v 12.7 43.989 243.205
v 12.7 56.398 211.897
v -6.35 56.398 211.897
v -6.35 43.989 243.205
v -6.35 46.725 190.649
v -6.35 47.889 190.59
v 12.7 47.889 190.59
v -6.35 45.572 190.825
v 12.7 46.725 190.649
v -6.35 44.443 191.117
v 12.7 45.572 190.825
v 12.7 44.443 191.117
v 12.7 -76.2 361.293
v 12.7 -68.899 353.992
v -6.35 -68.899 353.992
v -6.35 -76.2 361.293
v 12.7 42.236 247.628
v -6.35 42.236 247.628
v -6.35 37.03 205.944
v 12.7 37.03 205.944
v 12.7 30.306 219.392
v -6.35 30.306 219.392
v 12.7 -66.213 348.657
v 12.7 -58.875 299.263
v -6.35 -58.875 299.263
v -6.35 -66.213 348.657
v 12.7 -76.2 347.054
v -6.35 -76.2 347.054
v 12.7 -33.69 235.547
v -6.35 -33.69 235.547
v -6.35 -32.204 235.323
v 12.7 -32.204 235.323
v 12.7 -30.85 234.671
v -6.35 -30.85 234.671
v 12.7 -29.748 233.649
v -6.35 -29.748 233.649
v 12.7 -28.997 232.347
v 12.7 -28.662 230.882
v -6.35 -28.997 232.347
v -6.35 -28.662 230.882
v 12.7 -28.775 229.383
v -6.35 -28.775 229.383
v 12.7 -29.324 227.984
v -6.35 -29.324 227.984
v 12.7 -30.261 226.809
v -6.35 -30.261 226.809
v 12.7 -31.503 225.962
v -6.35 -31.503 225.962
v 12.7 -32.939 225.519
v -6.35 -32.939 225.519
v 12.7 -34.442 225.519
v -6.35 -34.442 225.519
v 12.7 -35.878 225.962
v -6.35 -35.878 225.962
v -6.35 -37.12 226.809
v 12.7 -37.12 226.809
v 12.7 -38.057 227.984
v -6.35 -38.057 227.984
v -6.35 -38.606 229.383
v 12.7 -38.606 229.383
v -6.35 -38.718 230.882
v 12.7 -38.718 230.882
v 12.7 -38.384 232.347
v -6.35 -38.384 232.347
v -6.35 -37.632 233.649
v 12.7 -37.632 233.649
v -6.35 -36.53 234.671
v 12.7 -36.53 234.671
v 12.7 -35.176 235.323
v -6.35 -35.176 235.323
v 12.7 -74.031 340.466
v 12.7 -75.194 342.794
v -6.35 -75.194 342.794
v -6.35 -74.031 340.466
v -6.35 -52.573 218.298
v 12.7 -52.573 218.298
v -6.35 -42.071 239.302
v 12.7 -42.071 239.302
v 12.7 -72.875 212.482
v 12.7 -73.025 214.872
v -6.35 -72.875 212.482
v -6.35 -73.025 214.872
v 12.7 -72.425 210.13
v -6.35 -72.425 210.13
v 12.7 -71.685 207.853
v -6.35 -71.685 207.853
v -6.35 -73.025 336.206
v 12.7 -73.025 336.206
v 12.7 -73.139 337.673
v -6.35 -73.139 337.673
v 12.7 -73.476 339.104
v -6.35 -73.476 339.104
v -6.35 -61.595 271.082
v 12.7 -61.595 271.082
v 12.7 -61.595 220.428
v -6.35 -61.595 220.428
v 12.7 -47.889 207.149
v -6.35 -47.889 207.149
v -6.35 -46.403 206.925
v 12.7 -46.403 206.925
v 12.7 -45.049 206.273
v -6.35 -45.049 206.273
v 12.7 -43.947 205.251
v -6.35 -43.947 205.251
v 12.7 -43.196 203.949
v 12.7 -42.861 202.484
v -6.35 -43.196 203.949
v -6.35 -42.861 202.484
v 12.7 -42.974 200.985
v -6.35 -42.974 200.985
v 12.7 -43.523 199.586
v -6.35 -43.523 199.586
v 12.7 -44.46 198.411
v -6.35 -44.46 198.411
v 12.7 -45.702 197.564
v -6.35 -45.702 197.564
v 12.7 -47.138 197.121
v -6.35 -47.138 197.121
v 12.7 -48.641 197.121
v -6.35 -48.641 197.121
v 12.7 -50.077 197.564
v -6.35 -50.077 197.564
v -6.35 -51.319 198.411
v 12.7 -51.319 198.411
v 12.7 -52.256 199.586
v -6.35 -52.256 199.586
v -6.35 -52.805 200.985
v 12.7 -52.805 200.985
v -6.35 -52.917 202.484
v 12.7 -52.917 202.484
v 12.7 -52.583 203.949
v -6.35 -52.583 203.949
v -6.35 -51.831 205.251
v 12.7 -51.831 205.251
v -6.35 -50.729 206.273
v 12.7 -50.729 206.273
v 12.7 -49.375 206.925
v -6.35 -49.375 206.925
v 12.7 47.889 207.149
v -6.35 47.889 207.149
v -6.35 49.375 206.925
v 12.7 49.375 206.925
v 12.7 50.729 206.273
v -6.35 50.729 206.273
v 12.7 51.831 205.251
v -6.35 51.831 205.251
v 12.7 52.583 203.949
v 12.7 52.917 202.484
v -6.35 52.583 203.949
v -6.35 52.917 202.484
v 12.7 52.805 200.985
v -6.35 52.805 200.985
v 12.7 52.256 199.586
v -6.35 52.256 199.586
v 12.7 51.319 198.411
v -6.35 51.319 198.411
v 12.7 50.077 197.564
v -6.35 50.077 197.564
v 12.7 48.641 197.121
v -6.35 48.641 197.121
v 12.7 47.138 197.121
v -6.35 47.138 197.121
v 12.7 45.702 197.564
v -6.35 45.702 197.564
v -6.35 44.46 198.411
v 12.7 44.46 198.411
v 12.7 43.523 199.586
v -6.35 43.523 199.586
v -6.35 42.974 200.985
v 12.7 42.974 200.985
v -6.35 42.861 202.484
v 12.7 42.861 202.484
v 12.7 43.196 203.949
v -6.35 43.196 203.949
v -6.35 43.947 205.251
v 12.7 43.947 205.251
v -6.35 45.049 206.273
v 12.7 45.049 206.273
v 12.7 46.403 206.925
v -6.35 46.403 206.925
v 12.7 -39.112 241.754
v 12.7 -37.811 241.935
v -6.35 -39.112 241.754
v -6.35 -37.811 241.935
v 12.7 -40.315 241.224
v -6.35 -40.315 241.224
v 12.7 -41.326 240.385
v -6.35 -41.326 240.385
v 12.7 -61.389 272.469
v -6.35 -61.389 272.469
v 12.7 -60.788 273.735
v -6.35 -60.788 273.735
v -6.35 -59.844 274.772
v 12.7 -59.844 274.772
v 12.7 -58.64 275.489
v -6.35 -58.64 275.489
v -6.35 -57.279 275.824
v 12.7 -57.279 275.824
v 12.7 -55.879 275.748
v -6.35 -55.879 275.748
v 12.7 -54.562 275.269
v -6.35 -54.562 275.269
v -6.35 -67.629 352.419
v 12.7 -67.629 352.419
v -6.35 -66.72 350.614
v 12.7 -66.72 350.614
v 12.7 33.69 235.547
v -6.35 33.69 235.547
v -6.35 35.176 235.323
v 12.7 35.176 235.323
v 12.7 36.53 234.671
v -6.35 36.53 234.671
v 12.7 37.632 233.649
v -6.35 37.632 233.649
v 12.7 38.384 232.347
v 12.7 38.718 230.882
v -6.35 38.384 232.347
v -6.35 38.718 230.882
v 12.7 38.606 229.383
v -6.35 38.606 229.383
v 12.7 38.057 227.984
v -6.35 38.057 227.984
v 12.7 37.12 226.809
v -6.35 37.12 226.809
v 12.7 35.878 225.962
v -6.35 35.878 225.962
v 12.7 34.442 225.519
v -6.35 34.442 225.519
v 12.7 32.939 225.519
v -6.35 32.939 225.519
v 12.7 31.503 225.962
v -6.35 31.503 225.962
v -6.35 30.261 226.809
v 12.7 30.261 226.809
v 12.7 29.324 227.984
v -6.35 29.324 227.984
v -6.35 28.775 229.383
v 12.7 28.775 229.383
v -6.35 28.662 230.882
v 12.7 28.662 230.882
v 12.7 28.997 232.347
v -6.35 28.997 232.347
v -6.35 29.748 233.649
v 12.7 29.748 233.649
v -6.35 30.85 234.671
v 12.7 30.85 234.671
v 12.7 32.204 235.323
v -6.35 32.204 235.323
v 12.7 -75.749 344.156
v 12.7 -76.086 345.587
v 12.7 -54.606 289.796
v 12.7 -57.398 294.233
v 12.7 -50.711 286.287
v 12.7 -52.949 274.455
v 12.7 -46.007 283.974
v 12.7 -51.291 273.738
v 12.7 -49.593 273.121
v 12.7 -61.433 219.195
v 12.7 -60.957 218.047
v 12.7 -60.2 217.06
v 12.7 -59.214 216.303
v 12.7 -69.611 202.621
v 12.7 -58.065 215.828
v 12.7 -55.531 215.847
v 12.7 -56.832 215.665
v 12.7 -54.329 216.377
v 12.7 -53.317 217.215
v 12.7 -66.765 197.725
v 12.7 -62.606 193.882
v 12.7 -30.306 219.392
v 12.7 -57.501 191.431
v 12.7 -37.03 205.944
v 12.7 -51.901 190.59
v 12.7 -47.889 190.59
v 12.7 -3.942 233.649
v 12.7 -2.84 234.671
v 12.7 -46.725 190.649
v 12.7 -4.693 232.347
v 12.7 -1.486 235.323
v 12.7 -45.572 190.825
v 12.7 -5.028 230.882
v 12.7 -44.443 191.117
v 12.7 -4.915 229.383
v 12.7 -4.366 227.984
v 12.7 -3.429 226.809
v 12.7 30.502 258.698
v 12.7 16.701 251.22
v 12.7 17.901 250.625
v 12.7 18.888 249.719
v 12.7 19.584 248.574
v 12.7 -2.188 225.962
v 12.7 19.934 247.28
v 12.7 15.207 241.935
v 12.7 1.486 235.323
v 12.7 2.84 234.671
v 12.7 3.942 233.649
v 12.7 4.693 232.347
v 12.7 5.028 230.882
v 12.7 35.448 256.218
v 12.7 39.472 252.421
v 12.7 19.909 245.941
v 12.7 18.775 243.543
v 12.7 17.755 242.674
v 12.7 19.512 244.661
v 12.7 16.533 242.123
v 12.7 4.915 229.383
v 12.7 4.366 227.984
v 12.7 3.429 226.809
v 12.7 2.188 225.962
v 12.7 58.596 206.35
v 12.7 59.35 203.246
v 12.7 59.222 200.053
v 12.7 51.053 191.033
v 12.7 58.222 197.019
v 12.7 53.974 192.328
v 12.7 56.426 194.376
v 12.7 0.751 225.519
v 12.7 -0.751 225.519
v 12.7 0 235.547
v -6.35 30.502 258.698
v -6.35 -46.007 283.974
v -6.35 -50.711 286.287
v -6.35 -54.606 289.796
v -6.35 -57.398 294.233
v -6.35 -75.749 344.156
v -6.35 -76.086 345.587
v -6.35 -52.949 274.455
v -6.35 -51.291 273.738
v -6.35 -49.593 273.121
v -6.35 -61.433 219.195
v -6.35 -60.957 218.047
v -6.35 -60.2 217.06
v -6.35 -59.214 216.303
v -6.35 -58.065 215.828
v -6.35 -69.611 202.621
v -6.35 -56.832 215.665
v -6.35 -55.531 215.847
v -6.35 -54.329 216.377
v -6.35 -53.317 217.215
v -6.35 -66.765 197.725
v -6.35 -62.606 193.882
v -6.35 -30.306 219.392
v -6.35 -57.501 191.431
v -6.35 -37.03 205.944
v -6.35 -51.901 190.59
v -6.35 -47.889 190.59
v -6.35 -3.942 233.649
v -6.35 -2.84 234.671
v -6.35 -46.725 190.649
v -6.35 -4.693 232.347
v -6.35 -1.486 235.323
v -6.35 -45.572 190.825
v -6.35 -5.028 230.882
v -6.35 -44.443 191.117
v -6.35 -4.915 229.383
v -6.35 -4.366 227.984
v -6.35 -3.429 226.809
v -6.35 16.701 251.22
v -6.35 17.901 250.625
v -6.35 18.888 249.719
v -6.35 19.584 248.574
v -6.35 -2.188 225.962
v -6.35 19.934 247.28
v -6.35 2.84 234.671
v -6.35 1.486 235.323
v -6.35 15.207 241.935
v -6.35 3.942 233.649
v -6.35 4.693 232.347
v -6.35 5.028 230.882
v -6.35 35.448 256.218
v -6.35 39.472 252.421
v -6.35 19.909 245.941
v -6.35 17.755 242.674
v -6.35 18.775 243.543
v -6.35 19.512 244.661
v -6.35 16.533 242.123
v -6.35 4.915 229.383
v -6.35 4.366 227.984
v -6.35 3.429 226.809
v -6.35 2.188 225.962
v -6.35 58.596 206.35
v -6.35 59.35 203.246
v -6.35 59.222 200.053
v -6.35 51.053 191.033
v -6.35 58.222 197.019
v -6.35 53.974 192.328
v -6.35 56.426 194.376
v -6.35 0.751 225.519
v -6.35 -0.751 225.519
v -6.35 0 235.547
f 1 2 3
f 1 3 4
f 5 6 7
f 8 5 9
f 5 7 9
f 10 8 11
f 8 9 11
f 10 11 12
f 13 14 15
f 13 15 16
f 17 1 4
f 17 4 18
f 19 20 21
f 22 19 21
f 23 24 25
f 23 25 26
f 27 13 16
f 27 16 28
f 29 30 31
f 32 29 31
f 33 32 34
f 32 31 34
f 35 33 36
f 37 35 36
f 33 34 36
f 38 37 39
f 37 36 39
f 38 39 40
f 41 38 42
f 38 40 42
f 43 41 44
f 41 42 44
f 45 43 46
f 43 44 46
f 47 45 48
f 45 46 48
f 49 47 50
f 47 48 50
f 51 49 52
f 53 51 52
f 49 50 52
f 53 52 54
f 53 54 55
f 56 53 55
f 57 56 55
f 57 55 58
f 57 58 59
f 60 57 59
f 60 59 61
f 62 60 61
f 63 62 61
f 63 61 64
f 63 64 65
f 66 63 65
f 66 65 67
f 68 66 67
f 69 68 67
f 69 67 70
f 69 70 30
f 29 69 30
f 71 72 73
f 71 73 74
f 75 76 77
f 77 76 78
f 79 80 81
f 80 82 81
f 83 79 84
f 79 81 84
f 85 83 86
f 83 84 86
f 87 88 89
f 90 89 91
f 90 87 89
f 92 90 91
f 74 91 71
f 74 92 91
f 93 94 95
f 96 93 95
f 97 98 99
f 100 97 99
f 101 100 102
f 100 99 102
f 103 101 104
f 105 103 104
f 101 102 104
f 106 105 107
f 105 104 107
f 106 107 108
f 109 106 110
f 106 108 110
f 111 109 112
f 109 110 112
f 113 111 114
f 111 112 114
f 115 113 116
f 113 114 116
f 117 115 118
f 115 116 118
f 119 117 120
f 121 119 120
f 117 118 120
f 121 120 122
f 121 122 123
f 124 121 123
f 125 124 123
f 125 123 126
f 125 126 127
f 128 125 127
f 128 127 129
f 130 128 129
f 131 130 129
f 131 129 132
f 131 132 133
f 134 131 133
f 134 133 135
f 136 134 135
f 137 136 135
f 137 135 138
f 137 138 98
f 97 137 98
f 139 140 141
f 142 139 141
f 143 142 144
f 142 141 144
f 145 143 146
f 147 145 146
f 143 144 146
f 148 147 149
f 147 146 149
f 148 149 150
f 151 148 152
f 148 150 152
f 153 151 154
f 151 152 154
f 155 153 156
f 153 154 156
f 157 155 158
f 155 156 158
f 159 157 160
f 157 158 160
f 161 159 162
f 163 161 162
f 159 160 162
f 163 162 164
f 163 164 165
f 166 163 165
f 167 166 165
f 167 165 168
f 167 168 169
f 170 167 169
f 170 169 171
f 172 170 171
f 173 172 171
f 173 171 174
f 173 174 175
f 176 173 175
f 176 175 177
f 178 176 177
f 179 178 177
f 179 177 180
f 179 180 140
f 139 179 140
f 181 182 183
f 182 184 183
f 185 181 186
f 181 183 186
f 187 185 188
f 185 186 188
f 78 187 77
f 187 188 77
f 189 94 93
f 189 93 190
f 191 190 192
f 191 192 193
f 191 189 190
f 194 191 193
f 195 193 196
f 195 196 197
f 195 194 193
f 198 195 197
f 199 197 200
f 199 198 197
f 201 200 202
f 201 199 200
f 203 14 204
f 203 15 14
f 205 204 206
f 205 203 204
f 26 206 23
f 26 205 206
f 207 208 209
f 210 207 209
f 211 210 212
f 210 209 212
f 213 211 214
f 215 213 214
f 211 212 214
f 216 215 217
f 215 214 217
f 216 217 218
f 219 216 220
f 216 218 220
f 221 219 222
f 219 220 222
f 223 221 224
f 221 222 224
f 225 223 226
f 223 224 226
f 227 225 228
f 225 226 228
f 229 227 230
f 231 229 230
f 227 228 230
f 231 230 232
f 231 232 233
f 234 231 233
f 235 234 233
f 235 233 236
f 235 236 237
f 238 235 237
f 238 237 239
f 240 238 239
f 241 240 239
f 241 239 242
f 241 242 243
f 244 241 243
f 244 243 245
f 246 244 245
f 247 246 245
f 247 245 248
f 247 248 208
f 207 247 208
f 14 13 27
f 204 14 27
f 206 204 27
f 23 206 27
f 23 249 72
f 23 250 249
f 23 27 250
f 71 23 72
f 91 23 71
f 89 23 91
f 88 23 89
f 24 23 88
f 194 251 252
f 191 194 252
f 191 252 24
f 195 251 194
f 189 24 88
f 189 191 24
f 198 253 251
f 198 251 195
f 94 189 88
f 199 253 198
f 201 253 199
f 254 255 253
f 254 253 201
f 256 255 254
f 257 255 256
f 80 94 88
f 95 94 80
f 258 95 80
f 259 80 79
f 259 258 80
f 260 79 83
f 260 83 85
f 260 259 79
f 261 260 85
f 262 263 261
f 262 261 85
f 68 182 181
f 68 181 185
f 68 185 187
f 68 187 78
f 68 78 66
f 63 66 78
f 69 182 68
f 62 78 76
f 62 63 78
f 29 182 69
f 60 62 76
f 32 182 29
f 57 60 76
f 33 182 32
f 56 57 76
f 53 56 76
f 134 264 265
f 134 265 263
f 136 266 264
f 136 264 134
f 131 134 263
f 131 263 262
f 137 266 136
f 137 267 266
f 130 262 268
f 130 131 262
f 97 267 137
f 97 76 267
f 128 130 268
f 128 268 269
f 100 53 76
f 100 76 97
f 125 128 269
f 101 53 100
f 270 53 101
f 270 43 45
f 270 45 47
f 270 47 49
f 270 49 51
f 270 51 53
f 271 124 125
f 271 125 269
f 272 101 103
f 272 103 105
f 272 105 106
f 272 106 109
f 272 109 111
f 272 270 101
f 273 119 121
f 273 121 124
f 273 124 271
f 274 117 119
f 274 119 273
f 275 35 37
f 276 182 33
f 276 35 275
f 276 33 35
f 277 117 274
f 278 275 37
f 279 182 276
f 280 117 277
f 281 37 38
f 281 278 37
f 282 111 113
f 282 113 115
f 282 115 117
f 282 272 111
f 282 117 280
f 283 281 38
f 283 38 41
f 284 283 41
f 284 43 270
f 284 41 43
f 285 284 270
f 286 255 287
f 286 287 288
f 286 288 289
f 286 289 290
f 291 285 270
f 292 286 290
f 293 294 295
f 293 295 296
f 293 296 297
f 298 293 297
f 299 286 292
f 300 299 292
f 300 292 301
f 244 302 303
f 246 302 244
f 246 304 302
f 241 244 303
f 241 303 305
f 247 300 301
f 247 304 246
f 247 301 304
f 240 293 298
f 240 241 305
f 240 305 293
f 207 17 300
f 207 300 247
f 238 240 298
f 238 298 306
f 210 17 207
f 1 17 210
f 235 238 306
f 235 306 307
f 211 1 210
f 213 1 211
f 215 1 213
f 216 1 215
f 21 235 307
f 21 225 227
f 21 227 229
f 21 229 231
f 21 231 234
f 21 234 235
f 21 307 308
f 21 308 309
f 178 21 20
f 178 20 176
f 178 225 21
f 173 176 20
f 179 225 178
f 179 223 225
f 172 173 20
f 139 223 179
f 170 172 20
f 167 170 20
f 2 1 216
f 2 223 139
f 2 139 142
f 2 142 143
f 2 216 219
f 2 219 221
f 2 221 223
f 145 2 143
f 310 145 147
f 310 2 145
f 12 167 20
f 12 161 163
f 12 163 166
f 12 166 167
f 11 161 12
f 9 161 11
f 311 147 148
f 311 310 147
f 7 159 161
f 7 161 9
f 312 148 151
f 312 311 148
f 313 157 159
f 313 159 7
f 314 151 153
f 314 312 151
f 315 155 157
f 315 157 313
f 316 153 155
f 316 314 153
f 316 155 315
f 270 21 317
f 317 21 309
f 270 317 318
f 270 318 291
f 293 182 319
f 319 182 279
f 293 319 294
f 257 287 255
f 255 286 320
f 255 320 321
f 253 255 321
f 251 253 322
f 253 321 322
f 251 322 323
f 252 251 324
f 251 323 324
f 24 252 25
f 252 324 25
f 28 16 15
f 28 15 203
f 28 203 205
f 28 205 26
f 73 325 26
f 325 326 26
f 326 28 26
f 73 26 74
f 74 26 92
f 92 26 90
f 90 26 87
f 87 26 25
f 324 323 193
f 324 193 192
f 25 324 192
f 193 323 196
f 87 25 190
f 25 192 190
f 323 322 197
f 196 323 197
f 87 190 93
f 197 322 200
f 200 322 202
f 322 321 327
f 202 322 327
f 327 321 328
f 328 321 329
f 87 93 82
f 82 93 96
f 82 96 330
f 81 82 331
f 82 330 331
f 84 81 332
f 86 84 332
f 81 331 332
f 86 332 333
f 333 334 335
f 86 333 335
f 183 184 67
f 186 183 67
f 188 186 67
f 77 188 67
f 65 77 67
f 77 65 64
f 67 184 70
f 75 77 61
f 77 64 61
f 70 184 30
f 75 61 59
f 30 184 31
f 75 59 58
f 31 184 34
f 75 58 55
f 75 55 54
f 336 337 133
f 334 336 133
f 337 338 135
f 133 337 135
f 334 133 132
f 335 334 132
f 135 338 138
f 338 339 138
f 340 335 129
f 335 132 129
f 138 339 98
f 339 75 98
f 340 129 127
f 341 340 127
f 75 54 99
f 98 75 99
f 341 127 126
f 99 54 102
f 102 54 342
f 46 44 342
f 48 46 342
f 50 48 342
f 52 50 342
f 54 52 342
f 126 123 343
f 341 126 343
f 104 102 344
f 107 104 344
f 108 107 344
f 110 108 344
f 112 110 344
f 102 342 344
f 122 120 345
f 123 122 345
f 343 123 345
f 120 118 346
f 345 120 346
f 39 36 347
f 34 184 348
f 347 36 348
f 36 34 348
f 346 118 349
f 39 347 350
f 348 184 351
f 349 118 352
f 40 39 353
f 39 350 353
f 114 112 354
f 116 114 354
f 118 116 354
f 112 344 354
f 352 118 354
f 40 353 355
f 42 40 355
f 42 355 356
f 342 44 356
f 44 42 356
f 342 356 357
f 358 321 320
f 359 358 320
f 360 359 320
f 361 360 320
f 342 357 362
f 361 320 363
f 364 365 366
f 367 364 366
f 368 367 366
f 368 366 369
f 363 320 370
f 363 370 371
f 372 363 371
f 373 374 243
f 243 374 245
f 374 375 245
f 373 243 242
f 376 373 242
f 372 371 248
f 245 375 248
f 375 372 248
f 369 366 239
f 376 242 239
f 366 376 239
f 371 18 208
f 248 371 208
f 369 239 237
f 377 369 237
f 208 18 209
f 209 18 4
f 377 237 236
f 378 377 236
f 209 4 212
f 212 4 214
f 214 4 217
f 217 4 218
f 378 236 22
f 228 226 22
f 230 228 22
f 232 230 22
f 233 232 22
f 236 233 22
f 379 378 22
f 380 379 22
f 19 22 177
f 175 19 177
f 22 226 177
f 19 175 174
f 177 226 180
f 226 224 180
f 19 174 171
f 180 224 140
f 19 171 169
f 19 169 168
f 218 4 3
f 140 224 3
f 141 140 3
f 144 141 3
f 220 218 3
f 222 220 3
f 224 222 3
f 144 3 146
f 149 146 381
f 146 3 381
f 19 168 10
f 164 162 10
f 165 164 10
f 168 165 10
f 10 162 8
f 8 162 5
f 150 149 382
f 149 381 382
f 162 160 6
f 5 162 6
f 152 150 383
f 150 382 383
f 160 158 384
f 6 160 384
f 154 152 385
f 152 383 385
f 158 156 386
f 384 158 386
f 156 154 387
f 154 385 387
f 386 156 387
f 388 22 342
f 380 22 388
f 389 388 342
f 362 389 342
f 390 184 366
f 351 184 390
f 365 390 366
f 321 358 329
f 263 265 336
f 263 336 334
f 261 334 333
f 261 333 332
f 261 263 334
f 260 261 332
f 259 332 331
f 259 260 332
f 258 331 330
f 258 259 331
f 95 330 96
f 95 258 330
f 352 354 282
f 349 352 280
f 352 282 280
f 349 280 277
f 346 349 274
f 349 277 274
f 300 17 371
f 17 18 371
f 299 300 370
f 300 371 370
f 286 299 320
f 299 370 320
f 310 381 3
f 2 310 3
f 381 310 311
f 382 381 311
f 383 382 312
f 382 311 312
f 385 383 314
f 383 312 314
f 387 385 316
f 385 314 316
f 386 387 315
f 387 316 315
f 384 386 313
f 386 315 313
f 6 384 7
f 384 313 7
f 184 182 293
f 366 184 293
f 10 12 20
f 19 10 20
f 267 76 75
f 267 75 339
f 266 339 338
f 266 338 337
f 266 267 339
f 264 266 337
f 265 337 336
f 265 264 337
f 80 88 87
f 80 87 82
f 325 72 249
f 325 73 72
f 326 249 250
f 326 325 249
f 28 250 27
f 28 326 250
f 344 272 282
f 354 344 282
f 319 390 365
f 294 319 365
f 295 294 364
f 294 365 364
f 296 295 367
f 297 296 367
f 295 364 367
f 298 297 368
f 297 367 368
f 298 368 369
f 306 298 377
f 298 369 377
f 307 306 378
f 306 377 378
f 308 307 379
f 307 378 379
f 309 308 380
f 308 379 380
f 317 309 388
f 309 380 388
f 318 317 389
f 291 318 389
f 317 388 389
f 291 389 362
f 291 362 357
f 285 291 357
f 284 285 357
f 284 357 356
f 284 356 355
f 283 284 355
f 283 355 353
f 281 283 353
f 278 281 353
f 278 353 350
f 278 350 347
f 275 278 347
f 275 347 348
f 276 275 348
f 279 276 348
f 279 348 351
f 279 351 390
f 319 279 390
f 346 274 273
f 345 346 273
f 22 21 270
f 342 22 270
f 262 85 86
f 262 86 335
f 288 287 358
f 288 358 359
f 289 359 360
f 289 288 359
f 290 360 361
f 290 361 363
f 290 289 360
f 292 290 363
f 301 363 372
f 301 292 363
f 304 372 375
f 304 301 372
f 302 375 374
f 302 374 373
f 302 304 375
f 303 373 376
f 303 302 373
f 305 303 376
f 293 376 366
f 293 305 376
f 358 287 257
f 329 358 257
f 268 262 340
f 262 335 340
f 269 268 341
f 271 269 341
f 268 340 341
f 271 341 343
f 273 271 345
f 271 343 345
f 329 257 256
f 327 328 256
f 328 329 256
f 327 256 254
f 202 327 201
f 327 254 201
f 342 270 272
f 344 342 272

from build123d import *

# Parameters (mm, degrees)
SKETCH1_R               = 7.9375
SKETCH1_R_2             = 11.1125
BOSS_EXTRUDE1_DEPTH     = 12.7
F_8_CLEARANCE_HOLE1_D   = 4.4958
SKETCH5_R               = 18.415
CUT_EXTRUDE1_DEPTH      = 13.7
SKETCH7_R               = 9.525
CUT_EXTRUDE2_DEPTH      = 13.7
CUT_EXTRUDE3_DEPTH      = 13.7
BOSS_EXTRUDE2_DEPTH     = 12.7
CUT_EXTRUDE4_DEPTH      = 13.7
SKETCH11_W              = 12.7
SKETCH11_H              = 178.054
CUT_EXTRUDE5_DEPTH      = 3.175
BOSS_EXTRUDE3_DEPTH     = 19.05
CUT_EXTRUDE6_DEPTH      = 20.05
F_3_8_CLEARANCE_HOLE1_D = 10.0838
CUT_EXTRUDE7_DEPTH      = 20.05
BOSS_EXTRUDE4_DEPTH     = 19.05
FILLET1_R               = 19.05
FILLET2_R               = 9.525
CUT_EXTRUDE8_DEPTH      = 20.05
BOSS_EXTRUDE5_DEPTH     = 19.05
FILLET3_R               = 4.7625


with BuildPart() as part:
    # Sketch1 → Boss-Extrude1 (new body)
    with BuildSketch(Plane(origin=(0, 0, 0), x_dir=(0, 0, -1), z_dir=(1, 0, 0))):
        with BuildLine():
            Line((93.345, 0), (55.245, 50.8))
            Line((55.245, 50.8), (-160.655, 50.8))
            ThreePointArc((-160.655, 50.8), (-211.455, 0), (-160.655, -50.8))
            Line((-160.655, -50.8), (55.245, -50.8))
            Line((55.245, -50.8), (93.345, 0))
        make_face()
        with Locations((-88.9, 0)):
            Circle(SKETCH1_R, mode=Mode.SUBTRACT)
        with Locations((-38.1, 0)):
            Circle(SKETCH1_R, mode=Mode.SUBTRACT)
        with Locations((-160.655, 0)):
            Circle(SKETCH1_R_2, mode=Mode.SUBTRACT)
        Circle(SKETCH1_R, mode=Mode.SUBTRACT)
    extrude(amount=BOSS_EXTRUDE1_DEPTH)

    # #8 Clearance Hole1 (through all)
    with Locations(Plane.ZY):
        with Locations((-17.691104559, 17.691104559), (17.691104559, 17.691104559), (17.691104559, -17.691104559), (-17.691104559, -17.691104559)):
            Hole(F_8_CLEARANCE_HOLE1_D / 2)

    # Sketch5 → Cut-Extrude1 (cut, through all)
    with BuildSketch(Plane.ZY):
        Circle(SKETCH5_R)
    extrude(amount=-CUT_EXTRUDE1_DEPTH, mode=Mode.SUBTRACT)

    # Sketch7 → Cut-Extrude2 (cut, through all)
    with BuildSketch(Plane.ZY):
        with Locations((-55.245, 0)):
            Circle(SKETCH7_R)
    extrude(amount=-CUT_EXTRUDE2_DEPTH, mode=Mode.SUBTRACT)

    # Sketch8 → Cut-Extrude3 (cut, through all)
    with BuildSketch(Plane(origin=(12.7, 0, 0), x_dir=(0, 0, -1), z_dir=(1, 0, 0))):
        Polygon((-160.655, 50.8), (-211.455, 25.4), (-211.455, -25.4), (-160.655, -50.8), (-233.239745749, -50.8), (-233.239745749, 50.8), align=None)
    extrude(amount=-CUT_EXTRUDE3_DEPTH, mode=Mode.SUBTRACT)

    # Sketch9 → Boss-Extrude2 (add)
    with BuildSketch(Plane(origin=(12.7, 0, 0), x_dir=(0, 0, -1), z_dir=(1, 0, 0))):
        Polygon((-160.655, 50.8), (-211.455, 25.4), (-211.455, 0), (-211.455, -25.4), (-160.655, -50.8), (-160.655, -40.64), (-202.749323348, 0), (-160.655, 40.64), align=None)
    extrude(amount=-BOSS_EXTRUDE2_DEPTH)

    # Sketch10 → Cut-Extrude4 (cut, through all)
    with BuildSketch(Plane.ZY):
        Polygon((-79.0575, -19.05), (-79.0575, 19.05), (-93.345, 0), align=None)
    extrude(amount=-CUT_EXTRUDE4_DEPTH, mode=Mode.SUBTRACT)

    # Sketch11 → Cut-Extrude5 (cut)
    with BuildSketch(Plane(origin=(0, 50.8, 0), x_dir=(1, 0, 0), z_dir=(0, 1, 0))):
        with Locations((6.35, -52.705)):
            Rectangle(SKETCH11_W, SKETCH11_H)
    cut_extrude5 = extrude(amount=-CUT_EXTRUDE5_DEPTH, mode=Mode.SUBTRACT)

    # Mirror1: Cut-Extrude5 across plane
    add(cut_extrude5.mirror(Plane.ZX), mode=Mode.SUBTRACT)

    # Sketch13 → Cut-Extrude6 (cut, through all)
    with BuildSketch(Plane(origin=(12.7, 0, 0), x_dir=(0, 0, -1), z_dir=(1, 0, 0))):
        Polygon((-161.254612663, -53.34), (-139.192, -53.34), (-139.192, -50.165), (33.782, -50.165), (33.782, -53.34), (56.515, -53.34), (81.5975, -19.896666667), (81.5975, 19.896666667), (56.515, 53.34), (33.782, 53.34), (33.782, 50.165), (-139.192, 50.165), (-139.192, 53.34), (-161.254612663, 53.34), (-213.995, 26.969806331), (-213.995, -26.969806331), align=None)
    extrude(amount=-CUT_EXTRUDE6_DEPTH, mode=Mode.SUBTRACT)


with BuildPart() as body_2:
    # Sketch12 → Boss-Extrude3 (new body)
    with BuildSketch(Plane(origin=(12.7, 0, 0), x_dir=(0, 0, -1), z_dir=(1, 0, 0))):
        with BuildLine():
            ThreePointArc((-211.89681554, -56.397839854), (-236.855, 0), (-211.89681554, 56.397839854))
            Line((-211.89681554, 56.397839854), (-243.205, 43.989212666))
            Line((-243.205, 43.989212666), (-243.205, -43.989212666))
            Line((-243.205, -43.989212666), (-211.89681554, -56.397839854))
        make_face()
        with BuildLine():
            Line((-217.805, 29.324515829), (-162.154031657, 57.15))
            Line((-162.154031657, 57.15), (-166.916531657, 66.675))
            Line((-166.916531657, 66.675), (-185.966531657, 66.675))
            Line((-185.966531657, 66.675), (-211.89681554, 56.397839854))
            ThreePointArc((-211.89681554, 56.397839854), (-236.855, 0), (-211.89681554, -56.397839854))
            Line((-211.89681554, -56.397839854), (-185.966531657, -66.675))
            Line((-185.966531657, -66.675), (-166.916531657, -66.675))
            Line((-166.916531657, -66.675), (-162.154031657, -57.15))
            Line((-162.154031657, -57.15), (-217.805, -29.324515829))
            Line((-217.805, -29.324515829), (-217.805, 29.324515829))
        make_face()
    extrude(amount=-BOSS_EXTRUDE3_DEPTH)

    # 3/8 Clearance Hole1 (through all)
    with Locations(Plane(origin=(12.7, 0, 0), x_dir=(0, 0, -1), z_dir=(1, 0, 0))):
        with Locations((-230.505, 0), (-230.505, 33.690140829), (-202.106936686, 47.889172486), (-230.505, -33.690140829), (-202.106936686, -47.889172486)):
            Hole(F_3_8_CLEARANCE_HOLE1_D / 2)

    # Sketch16 → Cut-Extrude7 (cut, through all)
    with BuildSketch(Plane(origin=(12.7, 0, 0), x_dir=(0, 0, -1), z_dir=(1, 0, 0))):
        with BuildLine():
            ThreePointArc((-190.589767426, 47.889172486), (-190.722432786, 46.146112328), (-191.117372542, 44.443208515))
            Line((-191.117372542, 44.443208515), (-162.86398324, 58.569903166))
            Line((-162.86398324, 58.569903166), (-166.916531657, 66.675))
            Line((-166.916531657, 66.675), (-185.966531657, 66.675))
            Line((-185.966531657, 66.675), (-206.35048523, 58.596062021))
            ThreePointArc((-206.35048523, 58.596062021), (-195.635015761, 57.415946719), (-190.589767426, 47.889172486))
        make_face()
        with BuildLine():
            Line((-162.86398324, 58.569903166), (-191.117372542, 44.443208515))
            ThreePointArc((-191.117372542, 44.443208515), (-191.551739911, 43.281243579), (-192.108559765, 42.172735946))
            Line((-192.108559765, 42.172735946), (-162.154031657, 57.15))
            Line((-162.154031657, 57.15), (-162.86398324, 58.569903166))
        make_face()
        with BuildLine():
            Line((-191.117372542, 44.443208515), (-205.943903995, 37.029942788))
            ThreePointArc((-205.943903995, 37.029942788), (-204.753711625, 36.680257722), (-203.532813606, 36.460609025))
            Line((-203.532813606, 36.460609025), (-192.108559765, 42.172735946))
            ThreePointArc((-192.108559765, 42.172735946), (-191.551739911, 43.281243579), (-191.117372542, 44.443208515))
        make_face()
        with BuildLine():
            Line((-219.3925, 30.305644786), (-219.3925, -30.305644786))
            Line((-219.3925, -30.305644786), (-205.943903995, -37.029942788))
            ThreePointArc((-205.943903995, -37.029942788), (-204.753711625, -36.680257722), (-203.532813606, -36.460609025))
            Line((-203.532813606, -36.460609025), (-217.805, -29.324515829))
            Line((-217.805, -29.324515829), (-217.805, 29.324515829))
            Line((-217.805, 29.324515829), (-203.532813606, 36.460609025))
            ThreePointArc((-203.532813606, 36.460609025), (-204.753711625, 36.680257722), (-205.943903995, 37.029942788))
            Line((-205.943903995, 37.029942788), (-219.3925, 30.305644786))
        make_face()
        with BuildLine():
            ThreePointArc((-203.532813606, -36.460609025), (-204.753711625, -36.680257722), (-205.943903995, -37.029942788))
            Line((-205.943903995, -37.029942788), (-191.117372542, -44.443208515))
            ThreePointArc((-191.117372542, -44.443208515), (-191.551739911, -43.281243579), (-192.108559765, -42.172735946))
            Line((-192.108559765, -42.172735946), (-203.532813606, -36.460609025))
        make_face()
        with BuildLine():
            ThreePointArc((-192.108559765, -42.172735946), (-191.551739911, -43.281243579), (-191.117372542, -44.443208515))
            Line((-191.117372542, -44.443208515), (-162.86398324, -58.569903166))
            Line((-162.86398324, -58.569903166), (-162.154031657, -57.15))
            Line((-162.154031657, -57.15), (-192.108559765, -42.172735946))
        make_face()
        with BuildLine():
            Line((-162.86398324, -58.569903166), (-191.117372542, -44.443208515))
            ThreePointArc((-191.117372542, -44.443208515), (-190.722432786, -46.146112328), (-190.589767426, -47.889172486))
            Line((-190.589767426, -47.889172486), (-190.589767426, -64.842635395))
            Line((-190.589767426, -64.842635395), (-185.966531657, -66.675))
            Line((-185.966531657, -66.675), (-166.916531657, -66.675))
            Line((-166.916531657, -66.675), (-162.86398324, -58.569903166))
        make_face()
    extrude(amount=-CUT_EXTRUDE7_DEPTH, mode=Mode.SUBTRACT)

    # Sketch17 → Boss-Extrude4 (add)
    with BuildSketch(Plane(origin=(12.7, 0, 0), x_dir=(0, 0, -1), z_dir=(1, 0, 0))):
        Polygon((-338.455, -73.025), (-211.234676528, -73.025), (-190.589767426, -64.842635395), (-243.205, -43.989212666), (-243.205, 43.989212666), (-255.905, 38.955718453), (-287.655, -57.15), (-351.768316876, -66.675), (-361.293316876, -76.2), (-344.805, -76.2), align=None)
    extrude(amount=-BOSS_EXTRUDE4_DEPTH)

    # Fillet1
    fillet1_edges = [body_2.edges().sort_by_distance(p)[0] for p in [
        (3.175, -73.025, 211.234676528),
        (3.175, -57.15, 287.655),
        (3.175, 38.955718453, 255.905),
        (3.175, -64.842635395, 190.589767426),
    ]]
    fillet(fillet1_edges, radius=FILLET1_R)

    # Fillet2
    fillet2_edges = [body_2.edges().sort_by_distance(p)[0] for p in [
        (3.175, -73.025, 338.455),
        (3.175, -76.2, 344.805),
        (3.175, -66.675, 351.768316876),
    ]]
    fillet(fillet2_edges, radius=FILLET2_R)

    # Sketch18 → Cut-Extrude8 (cut, through all)
    with BuildSketch(Plane(origin=(12.7, 0, 0), x_dir=(0, 0, -1), z_dir=(1, 0, 0))):
        with BuildLine():
            ThreePointArc((-273.120706312, -49.592608078), (-276.117108341, -56.027596012), (-280.520687302, -61.595))
            Line((-280.520687302, -61.595), (-214.872157895, -61.595))
            ThreePointArc((-214.872157895, -61.595), (-213.442985613, -61.459775654), (-212.064537448, -61.058901992))
            Line((-212.064537448, -61.058901992), (-206.832146979, -58.985106153))
            ThreePointArc((-206.832146979, -58.985106153), (-206.472989442, -58.831999008), (-206.122145618, -58.660696511))
            Line((-206.122145618, -58.660696511), (-207.218588082, -58.112475279))
            Line((-207.218588082, -58.112475279), (-241.935, -40.75426932))
            Line((-241.935, -40.75426932), (-241.935, 32.197558556))
            Line((-241.935, 32.197558556), (-243.416943097, 31.610208005))
            ThreePointArc((-243.416943097, 31.610208005), (-246.152147631, 29.755215195), (-247.844705879, 26.916625978))
            Line((-247.844705879, 26.916625978), (-273.120706312, -49.592608078))
        make_face()
    extrude(amount=-CUT_EXTRUDE8_DEPTH, mode=Mode.SUBTRACT)

    # Sketch19 → Boss-Extrude5 (add)
    with BuildSketch(Plane(origin=(12.7, 0, 0), x_dir=(0, 0, -1), z_dir=(1, 0, 0))):
        with BuildLine():
            ThreePointArc((-243.416943097, 31.610208005), (-246.152147631, 29.755215195), (-247.844705879, 26.916625978))
            Line((-247.844705879, 26.916625978), (-251.219614601, 16.700940075))
            ThreePointArc((-251.219614601, 16.700940075), (-245.940917069, 19.909009969), (-241.935, 15.206990348))
            Line((-241.935, 15.206990348), (-241.935, 32.197558556))
            Line((-241.935, 32.197558556), (-243.416943097, 31.610208005))
        make_face()
        with BuildLine():
            ThreePointArc((-271.08233553, -61.595), (-275.17466524, -59.268530337), (-275.268808735, -54.562070888))
            ThreePointArc((-275.268808735, -54.562070888), (-277.640258261, -58.268577072), (-280.520687302, -61.595))
            Line((-280.520687302, -61.595), (-271.08233553, -61.595))
        make_face()
        with BuildLine():
            Line((-206.122145618, -58.660696511), (-218.297957405, -52.572790618))
            ThreePointArc((-218.297957405, -52.572790618), (-216.376587841, -54.328705688), (-215.665312383, -56.8325))
            ThreePointArc((-215.665312383, -56.8325), (-217.060216337, -60.200096045), (-220.427812383, -61.595))
            Line((-220.427812383, -61.595), (-214.872157895, -61.595))
            ThreePointArc((-214.872157895, -61.595), (-213.442985613, -61.459775654), (-212.064537448, -61.058901992))
            Line((-212.064537448, -61.058901992), (-206.832146979, -58.985106153))
            ThreePointArc((-206.832146979, -58.985106153), (-206.472989442, -58.831999008), (-206.122145618, -58.660696511))
        make_face()
    extrude(amount=-BOSS_EXTRUDE5_DEPTH)

    # Fillet3
    fillet3_edges = [body_2.edges().sort_by_distance(p)[0] for p in [
        (3.175, -40.75426932, 241.935),
    ]]
    fillet(fillet3_edges, radius=FILLET3_R)


solid = body_2.part
